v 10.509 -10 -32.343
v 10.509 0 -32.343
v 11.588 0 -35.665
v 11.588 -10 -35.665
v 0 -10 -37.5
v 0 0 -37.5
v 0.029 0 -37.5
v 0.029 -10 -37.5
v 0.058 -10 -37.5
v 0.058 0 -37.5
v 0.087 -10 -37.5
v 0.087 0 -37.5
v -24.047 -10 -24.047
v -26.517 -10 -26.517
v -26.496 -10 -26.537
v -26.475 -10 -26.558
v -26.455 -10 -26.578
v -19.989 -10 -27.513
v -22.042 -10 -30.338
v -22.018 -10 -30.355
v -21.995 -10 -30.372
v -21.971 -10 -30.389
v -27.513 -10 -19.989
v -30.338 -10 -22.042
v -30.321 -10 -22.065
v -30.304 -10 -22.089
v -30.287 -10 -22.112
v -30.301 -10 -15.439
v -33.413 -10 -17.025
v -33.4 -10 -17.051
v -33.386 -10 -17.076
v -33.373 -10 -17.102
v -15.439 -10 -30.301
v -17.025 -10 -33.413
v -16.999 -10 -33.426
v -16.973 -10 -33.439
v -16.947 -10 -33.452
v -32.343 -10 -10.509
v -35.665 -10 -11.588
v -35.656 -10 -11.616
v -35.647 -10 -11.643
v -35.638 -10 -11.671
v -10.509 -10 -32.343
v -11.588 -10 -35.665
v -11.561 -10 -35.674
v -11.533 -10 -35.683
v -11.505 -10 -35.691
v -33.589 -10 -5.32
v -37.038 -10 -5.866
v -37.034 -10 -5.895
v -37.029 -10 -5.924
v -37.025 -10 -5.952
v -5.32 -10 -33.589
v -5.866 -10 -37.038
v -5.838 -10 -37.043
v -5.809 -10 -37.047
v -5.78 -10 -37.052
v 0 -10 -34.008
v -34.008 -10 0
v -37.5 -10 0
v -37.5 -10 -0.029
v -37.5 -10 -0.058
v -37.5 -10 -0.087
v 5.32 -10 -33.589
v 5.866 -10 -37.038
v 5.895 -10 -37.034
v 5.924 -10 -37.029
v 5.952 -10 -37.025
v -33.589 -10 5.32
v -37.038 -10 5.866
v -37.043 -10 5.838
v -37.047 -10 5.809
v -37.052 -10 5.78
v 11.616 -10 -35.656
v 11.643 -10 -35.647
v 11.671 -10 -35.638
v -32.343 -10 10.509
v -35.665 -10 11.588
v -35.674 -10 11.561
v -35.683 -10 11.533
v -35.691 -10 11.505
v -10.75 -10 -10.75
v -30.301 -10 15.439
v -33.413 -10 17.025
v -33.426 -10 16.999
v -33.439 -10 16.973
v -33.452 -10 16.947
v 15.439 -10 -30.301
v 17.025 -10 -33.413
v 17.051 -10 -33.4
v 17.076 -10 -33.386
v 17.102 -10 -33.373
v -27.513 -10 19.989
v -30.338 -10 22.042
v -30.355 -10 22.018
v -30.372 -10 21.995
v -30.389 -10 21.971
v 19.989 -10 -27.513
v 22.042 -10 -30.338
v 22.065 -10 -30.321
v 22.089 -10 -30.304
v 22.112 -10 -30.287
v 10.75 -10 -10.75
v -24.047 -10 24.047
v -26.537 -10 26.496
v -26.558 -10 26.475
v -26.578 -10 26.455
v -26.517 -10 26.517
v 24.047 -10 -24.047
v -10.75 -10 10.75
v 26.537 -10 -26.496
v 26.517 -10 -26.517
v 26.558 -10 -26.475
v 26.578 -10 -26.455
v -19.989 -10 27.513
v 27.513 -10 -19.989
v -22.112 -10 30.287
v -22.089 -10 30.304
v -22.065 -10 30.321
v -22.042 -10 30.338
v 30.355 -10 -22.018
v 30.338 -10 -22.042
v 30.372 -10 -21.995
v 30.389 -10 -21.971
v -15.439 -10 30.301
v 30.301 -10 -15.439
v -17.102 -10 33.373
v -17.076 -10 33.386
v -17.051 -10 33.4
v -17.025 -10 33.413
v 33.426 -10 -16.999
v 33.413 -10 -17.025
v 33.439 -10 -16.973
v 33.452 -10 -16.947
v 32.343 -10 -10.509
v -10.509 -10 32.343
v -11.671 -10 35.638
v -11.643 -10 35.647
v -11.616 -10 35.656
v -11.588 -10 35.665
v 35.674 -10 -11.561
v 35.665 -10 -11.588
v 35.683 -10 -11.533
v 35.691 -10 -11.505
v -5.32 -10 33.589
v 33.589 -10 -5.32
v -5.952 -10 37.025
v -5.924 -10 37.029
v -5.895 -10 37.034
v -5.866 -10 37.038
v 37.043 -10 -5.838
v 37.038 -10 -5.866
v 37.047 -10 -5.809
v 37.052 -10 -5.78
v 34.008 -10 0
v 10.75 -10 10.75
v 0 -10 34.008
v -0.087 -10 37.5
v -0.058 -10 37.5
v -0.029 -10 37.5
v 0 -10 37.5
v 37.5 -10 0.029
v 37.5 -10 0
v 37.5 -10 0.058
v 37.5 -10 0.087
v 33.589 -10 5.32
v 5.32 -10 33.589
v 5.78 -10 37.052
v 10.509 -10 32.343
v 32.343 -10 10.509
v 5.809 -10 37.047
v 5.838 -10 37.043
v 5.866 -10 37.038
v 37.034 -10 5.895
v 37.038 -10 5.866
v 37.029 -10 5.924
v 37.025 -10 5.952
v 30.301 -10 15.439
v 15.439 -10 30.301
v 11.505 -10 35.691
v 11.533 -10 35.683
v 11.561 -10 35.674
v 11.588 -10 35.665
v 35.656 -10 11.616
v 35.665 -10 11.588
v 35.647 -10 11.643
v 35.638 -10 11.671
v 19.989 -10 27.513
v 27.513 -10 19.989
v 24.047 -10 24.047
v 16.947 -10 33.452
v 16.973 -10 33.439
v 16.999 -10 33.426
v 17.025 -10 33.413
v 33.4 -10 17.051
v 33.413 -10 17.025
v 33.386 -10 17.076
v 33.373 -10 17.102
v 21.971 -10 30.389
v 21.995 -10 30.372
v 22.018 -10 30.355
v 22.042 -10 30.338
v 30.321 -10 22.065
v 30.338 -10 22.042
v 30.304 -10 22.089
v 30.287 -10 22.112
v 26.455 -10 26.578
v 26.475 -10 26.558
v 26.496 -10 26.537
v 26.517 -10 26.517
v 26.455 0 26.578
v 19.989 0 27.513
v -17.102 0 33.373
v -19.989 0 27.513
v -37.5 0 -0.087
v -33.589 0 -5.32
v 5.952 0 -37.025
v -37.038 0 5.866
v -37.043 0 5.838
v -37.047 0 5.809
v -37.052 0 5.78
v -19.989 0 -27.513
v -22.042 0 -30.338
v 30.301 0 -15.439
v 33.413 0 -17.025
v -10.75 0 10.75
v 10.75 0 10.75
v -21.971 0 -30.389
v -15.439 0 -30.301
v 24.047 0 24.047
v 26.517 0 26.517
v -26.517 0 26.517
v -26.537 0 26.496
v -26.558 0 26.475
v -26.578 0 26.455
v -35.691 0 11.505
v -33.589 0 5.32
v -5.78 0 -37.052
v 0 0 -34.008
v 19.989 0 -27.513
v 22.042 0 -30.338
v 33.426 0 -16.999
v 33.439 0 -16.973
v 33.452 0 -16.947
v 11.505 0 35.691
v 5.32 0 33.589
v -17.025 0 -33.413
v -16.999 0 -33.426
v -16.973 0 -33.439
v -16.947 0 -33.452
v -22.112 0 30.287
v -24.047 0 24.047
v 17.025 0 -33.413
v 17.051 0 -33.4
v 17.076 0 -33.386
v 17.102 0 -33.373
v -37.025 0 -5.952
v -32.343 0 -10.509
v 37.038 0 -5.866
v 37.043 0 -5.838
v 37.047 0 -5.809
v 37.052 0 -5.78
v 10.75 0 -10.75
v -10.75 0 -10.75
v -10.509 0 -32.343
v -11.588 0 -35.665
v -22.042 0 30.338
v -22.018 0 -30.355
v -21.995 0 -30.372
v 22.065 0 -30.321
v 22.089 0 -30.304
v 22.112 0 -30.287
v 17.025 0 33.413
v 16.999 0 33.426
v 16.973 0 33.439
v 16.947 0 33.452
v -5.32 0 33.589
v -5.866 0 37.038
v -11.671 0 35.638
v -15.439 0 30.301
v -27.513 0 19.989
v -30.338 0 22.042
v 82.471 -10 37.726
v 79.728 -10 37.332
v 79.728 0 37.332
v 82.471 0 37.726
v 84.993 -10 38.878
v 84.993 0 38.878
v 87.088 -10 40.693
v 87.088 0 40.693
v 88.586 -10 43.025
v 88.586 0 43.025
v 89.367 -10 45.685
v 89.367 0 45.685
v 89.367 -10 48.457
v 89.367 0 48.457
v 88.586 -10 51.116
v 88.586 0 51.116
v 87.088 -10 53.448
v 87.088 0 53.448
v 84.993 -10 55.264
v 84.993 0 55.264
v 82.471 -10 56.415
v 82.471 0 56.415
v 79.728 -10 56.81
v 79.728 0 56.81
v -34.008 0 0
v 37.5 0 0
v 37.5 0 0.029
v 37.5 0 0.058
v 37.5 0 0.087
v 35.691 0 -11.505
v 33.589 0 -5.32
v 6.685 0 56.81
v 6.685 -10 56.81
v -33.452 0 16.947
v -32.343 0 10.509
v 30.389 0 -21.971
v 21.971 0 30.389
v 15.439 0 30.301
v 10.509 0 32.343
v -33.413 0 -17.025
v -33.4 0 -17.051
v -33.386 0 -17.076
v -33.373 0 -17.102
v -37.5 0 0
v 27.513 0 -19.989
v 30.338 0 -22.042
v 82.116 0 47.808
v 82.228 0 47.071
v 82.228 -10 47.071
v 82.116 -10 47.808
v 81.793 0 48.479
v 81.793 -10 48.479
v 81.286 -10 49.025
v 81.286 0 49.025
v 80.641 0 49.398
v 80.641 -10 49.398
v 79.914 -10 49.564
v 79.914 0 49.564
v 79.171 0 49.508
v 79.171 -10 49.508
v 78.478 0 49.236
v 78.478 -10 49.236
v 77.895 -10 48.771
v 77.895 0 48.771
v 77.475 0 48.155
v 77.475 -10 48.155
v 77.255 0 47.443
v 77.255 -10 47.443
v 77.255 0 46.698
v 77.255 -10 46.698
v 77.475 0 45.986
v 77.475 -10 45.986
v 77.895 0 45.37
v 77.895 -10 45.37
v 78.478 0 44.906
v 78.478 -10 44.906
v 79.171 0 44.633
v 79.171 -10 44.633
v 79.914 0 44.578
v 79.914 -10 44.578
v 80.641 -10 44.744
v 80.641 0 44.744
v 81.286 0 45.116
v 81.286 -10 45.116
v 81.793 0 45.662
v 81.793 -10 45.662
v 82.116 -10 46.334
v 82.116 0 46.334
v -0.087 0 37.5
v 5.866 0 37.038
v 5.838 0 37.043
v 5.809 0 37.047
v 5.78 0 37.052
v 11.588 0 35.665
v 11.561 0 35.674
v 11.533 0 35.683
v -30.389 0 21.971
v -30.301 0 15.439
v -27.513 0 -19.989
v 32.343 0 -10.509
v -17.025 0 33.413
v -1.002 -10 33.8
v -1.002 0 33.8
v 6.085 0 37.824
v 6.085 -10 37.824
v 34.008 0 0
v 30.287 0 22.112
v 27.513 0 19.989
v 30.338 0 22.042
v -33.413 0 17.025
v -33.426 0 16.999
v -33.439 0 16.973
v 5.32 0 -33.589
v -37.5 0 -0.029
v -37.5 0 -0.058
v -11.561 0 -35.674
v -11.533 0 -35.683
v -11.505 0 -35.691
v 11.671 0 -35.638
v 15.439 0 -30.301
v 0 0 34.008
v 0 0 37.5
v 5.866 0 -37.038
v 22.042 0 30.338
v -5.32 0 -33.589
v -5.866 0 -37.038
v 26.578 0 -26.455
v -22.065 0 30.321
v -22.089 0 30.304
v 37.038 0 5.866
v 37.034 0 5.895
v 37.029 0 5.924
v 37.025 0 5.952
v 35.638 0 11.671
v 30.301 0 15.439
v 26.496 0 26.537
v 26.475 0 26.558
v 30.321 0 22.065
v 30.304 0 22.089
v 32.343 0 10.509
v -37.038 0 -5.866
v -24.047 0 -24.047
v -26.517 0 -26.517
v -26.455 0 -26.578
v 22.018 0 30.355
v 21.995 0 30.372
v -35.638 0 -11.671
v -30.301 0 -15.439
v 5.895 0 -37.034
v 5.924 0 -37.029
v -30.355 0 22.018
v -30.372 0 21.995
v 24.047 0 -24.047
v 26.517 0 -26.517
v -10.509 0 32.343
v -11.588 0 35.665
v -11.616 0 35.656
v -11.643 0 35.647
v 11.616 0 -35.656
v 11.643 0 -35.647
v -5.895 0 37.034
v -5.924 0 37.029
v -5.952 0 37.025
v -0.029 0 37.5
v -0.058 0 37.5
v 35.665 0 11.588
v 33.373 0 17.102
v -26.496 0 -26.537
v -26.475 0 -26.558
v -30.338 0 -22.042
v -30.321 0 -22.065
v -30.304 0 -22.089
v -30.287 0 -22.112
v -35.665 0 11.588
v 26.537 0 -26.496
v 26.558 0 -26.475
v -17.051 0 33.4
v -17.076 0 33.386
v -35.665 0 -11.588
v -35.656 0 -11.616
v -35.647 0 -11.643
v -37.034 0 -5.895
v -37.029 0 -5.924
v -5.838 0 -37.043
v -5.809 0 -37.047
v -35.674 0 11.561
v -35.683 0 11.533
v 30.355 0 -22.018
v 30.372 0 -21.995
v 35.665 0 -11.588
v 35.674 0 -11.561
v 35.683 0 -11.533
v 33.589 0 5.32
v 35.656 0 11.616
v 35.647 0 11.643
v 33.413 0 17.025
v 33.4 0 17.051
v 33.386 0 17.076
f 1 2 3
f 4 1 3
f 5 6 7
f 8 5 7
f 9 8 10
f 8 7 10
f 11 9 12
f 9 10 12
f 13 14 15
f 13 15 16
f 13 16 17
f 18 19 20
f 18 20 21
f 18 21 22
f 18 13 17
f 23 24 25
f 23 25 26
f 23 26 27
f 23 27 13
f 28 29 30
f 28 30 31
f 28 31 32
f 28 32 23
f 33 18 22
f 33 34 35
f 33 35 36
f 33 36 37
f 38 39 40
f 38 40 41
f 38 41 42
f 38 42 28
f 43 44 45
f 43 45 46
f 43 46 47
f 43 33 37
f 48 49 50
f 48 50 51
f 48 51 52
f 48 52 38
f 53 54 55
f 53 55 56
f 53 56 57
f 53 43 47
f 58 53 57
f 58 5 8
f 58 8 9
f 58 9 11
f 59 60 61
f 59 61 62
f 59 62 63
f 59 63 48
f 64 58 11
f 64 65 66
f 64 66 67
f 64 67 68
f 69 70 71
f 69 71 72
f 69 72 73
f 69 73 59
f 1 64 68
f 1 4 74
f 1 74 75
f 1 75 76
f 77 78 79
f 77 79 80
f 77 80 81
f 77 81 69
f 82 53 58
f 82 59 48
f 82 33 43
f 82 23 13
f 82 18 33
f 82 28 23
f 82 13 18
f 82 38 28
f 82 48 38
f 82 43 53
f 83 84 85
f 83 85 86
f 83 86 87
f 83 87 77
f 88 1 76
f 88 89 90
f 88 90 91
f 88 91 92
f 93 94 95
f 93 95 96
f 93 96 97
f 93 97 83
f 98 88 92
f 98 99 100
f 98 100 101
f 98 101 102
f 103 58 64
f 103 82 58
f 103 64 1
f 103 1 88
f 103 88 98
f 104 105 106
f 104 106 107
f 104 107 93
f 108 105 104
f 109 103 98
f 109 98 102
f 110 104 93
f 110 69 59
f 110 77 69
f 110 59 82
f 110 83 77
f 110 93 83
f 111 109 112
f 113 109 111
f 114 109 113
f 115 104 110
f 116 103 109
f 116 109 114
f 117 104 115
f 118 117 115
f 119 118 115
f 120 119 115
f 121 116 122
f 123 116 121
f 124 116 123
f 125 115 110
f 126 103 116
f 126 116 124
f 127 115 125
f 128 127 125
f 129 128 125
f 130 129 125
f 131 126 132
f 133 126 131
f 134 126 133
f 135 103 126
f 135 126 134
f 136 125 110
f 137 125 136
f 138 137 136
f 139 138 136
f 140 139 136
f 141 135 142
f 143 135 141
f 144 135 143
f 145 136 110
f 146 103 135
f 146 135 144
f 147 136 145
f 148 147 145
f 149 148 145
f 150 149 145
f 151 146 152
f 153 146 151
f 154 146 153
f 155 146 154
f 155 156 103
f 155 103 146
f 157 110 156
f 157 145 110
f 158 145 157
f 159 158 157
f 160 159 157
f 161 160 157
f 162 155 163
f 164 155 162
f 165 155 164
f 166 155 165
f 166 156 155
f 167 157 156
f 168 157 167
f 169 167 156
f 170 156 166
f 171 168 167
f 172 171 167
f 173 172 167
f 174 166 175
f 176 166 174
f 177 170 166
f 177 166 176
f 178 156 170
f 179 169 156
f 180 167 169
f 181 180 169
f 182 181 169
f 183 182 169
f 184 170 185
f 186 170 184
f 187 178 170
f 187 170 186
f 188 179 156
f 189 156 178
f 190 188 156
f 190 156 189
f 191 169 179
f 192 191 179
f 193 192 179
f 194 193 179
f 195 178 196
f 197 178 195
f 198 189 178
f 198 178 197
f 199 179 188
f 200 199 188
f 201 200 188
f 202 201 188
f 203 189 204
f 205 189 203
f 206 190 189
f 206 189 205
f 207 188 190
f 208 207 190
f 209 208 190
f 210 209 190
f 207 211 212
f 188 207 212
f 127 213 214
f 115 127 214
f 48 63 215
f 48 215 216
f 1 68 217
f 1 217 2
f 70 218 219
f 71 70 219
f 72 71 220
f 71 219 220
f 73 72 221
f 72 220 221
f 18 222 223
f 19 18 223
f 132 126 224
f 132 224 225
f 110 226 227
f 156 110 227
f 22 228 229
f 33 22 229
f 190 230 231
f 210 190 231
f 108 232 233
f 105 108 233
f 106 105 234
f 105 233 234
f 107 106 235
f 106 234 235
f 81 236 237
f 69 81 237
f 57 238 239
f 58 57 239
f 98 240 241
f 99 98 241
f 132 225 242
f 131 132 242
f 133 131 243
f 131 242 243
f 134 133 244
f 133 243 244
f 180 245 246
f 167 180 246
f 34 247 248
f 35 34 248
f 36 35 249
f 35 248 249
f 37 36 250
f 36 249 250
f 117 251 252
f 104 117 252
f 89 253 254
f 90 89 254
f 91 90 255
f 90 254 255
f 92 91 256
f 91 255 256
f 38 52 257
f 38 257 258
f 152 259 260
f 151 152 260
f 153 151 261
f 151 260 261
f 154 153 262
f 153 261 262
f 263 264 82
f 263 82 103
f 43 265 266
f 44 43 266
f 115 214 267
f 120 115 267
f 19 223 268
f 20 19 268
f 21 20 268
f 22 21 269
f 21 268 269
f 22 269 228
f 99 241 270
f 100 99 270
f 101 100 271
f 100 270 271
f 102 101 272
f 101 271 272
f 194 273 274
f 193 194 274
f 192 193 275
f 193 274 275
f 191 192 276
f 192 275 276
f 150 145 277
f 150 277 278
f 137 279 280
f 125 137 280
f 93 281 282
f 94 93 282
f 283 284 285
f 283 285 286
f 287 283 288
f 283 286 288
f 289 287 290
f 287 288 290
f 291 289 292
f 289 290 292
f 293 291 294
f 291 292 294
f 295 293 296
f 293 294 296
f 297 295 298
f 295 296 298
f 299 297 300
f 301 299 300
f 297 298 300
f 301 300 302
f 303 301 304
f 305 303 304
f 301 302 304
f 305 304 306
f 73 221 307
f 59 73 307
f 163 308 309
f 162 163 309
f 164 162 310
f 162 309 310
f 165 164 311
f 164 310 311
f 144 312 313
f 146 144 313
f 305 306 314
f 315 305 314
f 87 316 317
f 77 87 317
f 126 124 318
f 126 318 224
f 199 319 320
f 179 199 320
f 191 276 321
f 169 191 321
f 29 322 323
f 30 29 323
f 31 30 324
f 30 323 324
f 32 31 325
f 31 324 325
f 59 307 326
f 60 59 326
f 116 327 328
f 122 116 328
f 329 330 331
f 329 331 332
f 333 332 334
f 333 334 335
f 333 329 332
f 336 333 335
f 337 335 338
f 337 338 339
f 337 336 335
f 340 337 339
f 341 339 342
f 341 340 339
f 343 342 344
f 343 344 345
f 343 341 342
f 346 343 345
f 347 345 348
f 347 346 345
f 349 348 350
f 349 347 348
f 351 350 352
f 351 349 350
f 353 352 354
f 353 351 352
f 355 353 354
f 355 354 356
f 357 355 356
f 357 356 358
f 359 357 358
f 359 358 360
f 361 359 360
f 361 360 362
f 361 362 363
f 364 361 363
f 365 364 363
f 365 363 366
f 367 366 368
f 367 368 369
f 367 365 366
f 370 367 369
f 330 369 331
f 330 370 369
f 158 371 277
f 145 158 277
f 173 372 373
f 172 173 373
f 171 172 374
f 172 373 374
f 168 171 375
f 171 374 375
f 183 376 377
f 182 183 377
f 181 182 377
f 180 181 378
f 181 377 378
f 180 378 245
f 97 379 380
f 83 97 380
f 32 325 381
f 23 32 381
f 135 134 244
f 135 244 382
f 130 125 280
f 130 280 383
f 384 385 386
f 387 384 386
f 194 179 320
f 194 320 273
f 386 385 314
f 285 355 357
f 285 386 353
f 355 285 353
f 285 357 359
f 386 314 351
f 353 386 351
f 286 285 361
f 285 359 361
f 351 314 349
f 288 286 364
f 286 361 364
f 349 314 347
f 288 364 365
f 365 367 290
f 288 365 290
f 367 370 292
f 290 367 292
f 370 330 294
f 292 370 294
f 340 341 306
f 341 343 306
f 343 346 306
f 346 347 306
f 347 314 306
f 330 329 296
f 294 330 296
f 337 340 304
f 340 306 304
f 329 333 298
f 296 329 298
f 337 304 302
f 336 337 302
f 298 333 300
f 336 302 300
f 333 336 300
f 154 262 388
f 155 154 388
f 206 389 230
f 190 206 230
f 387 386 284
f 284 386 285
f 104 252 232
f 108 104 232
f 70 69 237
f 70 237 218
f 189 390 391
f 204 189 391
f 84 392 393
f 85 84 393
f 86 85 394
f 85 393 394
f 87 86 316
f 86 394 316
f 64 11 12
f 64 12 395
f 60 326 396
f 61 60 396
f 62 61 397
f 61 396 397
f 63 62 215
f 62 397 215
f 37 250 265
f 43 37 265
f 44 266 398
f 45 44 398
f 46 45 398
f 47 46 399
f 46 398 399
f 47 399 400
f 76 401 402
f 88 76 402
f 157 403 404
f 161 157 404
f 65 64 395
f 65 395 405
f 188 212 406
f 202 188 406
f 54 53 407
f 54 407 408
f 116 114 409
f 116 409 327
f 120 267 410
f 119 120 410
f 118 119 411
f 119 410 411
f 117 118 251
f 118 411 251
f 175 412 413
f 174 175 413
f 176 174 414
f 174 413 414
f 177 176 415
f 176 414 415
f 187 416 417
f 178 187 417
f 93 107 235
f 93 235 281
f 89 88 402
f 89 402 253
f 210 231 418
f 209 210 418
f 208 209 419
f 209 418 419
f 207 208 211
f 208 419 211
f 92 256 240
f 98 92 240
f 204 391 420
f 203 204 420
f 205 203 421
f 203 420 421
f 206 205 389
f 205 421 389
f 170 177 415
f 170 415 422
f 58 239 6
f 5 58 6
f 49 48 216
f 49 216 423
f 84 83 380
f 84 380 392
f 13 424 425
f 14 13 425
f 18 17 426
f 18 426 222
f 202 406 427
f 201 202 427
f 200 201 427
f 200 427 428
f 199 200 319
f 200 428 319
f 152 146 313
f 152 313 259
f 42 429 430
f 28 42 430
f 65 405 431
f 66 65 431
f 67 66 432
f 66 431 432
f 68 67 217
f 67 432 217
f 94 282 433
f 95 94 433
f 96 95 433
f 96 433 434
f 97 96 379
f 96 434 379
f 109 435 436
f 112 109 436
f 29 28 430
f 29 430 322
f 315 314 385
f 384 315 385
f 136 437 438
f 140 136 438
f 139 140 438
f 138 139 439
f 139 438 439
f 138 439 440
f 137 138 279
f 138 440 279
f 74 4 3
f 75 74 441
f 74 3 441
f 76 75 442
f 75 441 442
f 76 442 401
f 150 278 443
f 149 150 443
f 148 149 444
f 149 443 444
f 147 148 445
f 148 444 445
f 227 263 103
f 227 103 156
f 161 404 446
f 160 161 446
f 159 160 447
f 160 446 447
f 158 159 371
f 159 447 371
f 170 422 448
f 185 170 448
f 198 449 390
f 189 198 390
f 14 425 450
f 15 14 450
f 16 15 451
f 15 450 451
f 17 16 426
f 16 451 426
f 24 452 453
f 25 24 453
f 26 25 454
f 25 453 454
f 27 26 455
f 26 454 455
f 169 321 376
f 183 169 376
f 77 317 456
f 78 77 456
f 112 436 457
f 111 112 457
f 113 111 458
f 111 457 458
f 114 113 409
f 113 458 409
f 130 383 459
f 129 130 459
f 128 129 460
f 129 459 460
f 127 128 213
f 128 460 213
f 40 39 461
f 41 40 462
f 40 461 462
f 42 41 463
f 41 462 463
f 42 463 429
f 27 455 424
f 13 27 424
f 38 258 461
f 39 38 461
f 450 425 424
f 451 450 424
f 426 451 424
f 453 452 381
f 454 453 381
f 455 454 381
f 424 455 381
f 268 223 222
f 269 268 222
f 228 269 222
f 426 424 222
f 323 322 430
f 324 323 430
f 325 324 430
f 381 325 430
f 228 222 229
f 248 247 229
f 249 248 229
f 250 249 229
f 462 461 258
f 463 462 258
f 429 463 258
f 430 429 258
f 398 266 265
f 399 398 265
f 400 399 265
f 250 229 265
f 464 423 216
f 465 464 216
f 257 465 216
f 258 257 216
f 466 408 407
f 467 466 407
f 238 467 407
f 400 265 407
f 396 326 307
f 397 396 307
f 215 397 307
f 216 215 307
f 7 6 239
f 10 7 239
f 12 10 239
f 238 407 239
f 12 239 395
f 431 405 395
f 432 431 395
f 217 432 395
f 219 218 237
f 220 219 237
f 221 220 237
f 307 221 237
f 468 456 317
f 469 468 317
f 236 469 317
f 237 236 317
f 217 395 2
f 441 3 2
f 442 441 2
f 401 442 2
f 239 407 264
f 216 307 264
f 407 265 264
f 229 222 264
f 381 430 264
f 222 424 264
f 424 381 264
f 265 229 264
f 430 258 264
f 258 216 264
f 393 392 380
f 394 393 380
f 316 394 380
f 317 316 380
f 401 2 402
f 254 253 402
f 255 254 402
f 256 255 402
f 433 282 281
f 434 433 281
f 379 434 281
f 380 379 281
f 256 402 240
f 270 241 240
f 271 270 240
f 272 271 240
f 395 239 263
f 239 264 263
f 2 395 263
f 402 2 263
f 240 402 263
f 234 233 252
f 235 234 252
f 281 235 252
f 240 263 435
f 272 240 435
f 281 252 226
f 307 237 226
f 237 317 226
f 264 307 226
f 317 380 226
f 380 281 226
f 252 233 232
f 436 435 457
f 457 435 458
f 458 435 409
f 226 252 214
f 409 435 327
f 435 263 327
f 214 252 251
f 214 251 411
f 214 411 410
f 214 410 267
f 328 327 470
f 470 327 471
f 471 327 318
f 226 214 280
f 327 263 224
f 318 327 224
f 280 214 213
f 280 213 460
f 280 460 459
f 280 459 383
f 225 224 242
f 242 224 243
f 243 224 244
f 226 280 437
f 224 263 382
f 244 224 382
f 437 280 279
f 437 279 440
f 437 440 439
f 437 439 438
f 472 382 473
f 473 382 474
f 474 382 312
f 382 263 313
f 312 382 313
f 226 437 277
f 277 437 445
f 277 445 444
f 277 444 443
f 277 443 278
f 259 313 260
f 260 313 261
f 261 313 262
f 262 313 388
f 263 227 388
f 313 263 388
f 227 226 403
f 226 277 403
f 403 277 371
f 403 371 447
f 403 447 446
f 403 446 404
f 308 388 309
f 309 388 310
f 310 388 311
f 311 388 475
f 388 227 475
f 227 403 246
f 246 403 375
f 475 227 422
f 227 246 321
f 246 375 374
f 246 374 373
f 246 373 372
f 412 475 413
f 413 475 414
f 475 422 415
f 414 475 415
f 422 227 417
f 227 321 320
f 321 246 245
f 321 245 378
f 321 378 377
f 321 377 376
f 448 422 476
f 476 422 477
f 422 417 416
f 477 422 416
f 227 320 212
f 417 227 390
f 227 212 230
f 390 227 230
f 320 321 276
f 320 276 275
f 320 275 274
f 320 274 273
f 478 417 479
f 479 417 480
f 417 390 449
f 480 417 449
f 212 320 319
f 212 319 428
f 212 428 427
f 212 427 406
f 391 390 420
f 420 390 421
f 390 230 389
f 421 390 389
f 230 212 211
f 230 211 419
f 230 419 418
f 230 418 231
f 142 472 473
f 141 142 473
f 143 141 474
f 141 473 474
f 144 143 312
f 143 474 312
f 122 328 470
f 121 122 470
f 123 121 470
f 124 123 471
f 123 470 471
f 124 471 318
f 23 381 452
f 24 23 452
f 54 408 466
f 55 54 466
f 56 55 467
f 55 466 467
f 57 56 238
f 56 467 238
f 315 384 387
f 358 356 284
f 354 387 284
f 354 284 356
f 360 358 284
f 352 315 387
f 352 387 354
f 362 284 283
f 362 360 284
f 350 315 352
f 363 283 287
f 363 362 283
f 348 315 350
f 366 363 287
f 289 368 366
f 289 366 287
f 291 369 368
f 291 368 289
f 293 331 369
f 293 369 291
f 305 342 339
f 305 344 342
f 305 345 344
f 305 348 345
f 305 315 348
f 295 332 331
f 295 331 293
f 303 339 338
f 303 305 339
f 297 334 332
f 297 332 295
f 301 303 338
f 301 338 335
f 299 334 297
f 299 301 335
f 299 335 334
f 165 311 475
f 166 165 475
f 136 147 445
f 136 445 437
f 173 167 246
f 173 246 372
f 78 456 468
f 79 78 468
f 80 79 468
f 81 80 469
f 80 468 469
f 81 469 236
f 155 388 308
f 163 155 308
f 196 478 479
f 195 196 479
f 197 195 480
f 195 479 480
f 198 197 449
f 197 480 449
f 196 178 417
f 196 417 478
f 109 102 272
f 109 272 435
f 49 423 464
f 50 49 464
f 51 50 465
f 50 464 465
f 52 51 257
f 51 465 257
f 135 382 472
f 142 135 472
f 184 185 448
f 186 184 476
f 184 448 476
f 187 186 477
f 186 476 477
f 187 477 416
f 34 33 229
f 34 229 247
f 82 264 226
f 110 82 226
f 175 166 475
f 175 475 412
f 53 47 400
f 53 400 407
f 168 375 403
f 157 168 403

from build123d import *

# Parameters (mm, degrees)
F0_R     = 37.5
F0_W     = 21.5
F0_H     = 21.5
F1_DEPTH = 10
F3_DEPTH = 25
F4_R     = 2.5
F5_DEPTH = 10


with BuildPart() as f1:
    # F0 (on Front) → F1 (new body)
    with BuildSketch(Plane.XZ):
        Circle(F0_R)
        Rectangle(F0_W, F0_H, mode=Mode.SUBTRACT)
    extrude(amount=F1_DEPTH)

    # F2 (on Front) → F3 (intersect)
    with BuildSketch(Plane.XZ):
        Polygon((0, 34.007777), (0, 37.56503), (-5.319988, 33.589084), (-5.876465, 37.102542), (-10.508981, 32.343317), (-11.608233, 35.726467), (-15.439207, 30.301151), (-17.054167, 33.470687), (-19.98927, 27.512869), (-22.080171, 30.390748), (-24.047129, 24.047129), (-26.562488, 26.562488), (-27.512869, 19.98927), (-30.390748, 22.080171), (-30.301151, 15.439207), (-33.470687, 17.054167), (-32.343317, 10.508981), (-35.726467, 11.608233), (-33.589084, 5.319988), (-37.102542, 5.876465), (-34.007777, 0), (-37.56503, 0), (-33.589084, -5.319988), (-37.102542, -5.876465), (-32.343317, -10.508981), (-35.726467, -11.608233), (-30.301151, -15.439207), (-33.470687, -17.054167), (-27.512869, -19.98927), (-30.390748, -22.080171), (-24.047129, -24.047129), (-26.562488, -26.562488), (-19.98927, -27.512869), (-22.080171, -30.390748), (-15.439207, -30.301151), (-17.054167, -33.470687), (-10.508981, -32.343317), (-11.608233, -35.726467), (-5.319988, -33.589084), (-5.876465, -37.102542), (0, -34.007777), (0, -37.56503), (5.319988, -33.589084), (5.876465, -37.102542), (10.508981, -32.343317), (11.608233, -35.726467), (15.439207, -30.301151), (17.054167, -33.470687), (19.98927, -27.512869), (22.080171, -30.390748), (24.047129, -24.047129), (26.562488, -26.562488), (27.512869, -19.98927), (30.390748, -22.080171), (30.301151, -15.439207), (33.470687, -17.054167), (32.343317, -10.508981), (35.726467, -11.608233), (33.589084, -5.319988), (37.102542, -5.876465), (34.007777, 0), (37.56503, 0), (33.589084, 5.319988), (37.102542, 5.876465), (32.343317, 10.508981), (35.726467, 11.608233), (30.301151, 15.439207), (33.470687, 17.054167), (27.512869, 19.98927), (30.390748, 22.080171), (24.047129, 24.047129), (26.562488, 26.562488), (19.98927, 27.512869), (22.080171, 30.390748), (15.439207, 30.301151), (17.054167, 33.470687), (10.508981, 32.343317), (11.608233, 35.726467), (5.319988, 33.589084), (5.876465, 37.102542), align=None)
    extrude(amount=F3_DEPTH, mode=Mode.INTERSECT)


with BuildPart() as f5:
    # F4 (on Front) → F5 (new body)
    with BuildSketch(Plane.XZ):
        with BuildLine():
            Line((8.696713, 56.809544), (6.685412, 56.809544))
            Line((6.685412, 56.809544), (-1.002478, 33.799573))
            Line((-1.002478, 33.799573), (6.08512, 37.824191))
            Line((6.08512, 37.824191), (79.727527, 37.331889))
            ThreePointArc((79.727527, 37.331889), (89.466354, 47.070717), (79.727527, 56.809544))
            Line((79.727527, 56.809544), (8.696713, 56.809544))
        make_face()
        with Locations((79.727527, 47.070717)):
            Circle(F4_R, mode=Mode.SUBTRACT)
    extrude(amount=F5_DEPTH)


solid = Compound([f1.part, f5.part])
